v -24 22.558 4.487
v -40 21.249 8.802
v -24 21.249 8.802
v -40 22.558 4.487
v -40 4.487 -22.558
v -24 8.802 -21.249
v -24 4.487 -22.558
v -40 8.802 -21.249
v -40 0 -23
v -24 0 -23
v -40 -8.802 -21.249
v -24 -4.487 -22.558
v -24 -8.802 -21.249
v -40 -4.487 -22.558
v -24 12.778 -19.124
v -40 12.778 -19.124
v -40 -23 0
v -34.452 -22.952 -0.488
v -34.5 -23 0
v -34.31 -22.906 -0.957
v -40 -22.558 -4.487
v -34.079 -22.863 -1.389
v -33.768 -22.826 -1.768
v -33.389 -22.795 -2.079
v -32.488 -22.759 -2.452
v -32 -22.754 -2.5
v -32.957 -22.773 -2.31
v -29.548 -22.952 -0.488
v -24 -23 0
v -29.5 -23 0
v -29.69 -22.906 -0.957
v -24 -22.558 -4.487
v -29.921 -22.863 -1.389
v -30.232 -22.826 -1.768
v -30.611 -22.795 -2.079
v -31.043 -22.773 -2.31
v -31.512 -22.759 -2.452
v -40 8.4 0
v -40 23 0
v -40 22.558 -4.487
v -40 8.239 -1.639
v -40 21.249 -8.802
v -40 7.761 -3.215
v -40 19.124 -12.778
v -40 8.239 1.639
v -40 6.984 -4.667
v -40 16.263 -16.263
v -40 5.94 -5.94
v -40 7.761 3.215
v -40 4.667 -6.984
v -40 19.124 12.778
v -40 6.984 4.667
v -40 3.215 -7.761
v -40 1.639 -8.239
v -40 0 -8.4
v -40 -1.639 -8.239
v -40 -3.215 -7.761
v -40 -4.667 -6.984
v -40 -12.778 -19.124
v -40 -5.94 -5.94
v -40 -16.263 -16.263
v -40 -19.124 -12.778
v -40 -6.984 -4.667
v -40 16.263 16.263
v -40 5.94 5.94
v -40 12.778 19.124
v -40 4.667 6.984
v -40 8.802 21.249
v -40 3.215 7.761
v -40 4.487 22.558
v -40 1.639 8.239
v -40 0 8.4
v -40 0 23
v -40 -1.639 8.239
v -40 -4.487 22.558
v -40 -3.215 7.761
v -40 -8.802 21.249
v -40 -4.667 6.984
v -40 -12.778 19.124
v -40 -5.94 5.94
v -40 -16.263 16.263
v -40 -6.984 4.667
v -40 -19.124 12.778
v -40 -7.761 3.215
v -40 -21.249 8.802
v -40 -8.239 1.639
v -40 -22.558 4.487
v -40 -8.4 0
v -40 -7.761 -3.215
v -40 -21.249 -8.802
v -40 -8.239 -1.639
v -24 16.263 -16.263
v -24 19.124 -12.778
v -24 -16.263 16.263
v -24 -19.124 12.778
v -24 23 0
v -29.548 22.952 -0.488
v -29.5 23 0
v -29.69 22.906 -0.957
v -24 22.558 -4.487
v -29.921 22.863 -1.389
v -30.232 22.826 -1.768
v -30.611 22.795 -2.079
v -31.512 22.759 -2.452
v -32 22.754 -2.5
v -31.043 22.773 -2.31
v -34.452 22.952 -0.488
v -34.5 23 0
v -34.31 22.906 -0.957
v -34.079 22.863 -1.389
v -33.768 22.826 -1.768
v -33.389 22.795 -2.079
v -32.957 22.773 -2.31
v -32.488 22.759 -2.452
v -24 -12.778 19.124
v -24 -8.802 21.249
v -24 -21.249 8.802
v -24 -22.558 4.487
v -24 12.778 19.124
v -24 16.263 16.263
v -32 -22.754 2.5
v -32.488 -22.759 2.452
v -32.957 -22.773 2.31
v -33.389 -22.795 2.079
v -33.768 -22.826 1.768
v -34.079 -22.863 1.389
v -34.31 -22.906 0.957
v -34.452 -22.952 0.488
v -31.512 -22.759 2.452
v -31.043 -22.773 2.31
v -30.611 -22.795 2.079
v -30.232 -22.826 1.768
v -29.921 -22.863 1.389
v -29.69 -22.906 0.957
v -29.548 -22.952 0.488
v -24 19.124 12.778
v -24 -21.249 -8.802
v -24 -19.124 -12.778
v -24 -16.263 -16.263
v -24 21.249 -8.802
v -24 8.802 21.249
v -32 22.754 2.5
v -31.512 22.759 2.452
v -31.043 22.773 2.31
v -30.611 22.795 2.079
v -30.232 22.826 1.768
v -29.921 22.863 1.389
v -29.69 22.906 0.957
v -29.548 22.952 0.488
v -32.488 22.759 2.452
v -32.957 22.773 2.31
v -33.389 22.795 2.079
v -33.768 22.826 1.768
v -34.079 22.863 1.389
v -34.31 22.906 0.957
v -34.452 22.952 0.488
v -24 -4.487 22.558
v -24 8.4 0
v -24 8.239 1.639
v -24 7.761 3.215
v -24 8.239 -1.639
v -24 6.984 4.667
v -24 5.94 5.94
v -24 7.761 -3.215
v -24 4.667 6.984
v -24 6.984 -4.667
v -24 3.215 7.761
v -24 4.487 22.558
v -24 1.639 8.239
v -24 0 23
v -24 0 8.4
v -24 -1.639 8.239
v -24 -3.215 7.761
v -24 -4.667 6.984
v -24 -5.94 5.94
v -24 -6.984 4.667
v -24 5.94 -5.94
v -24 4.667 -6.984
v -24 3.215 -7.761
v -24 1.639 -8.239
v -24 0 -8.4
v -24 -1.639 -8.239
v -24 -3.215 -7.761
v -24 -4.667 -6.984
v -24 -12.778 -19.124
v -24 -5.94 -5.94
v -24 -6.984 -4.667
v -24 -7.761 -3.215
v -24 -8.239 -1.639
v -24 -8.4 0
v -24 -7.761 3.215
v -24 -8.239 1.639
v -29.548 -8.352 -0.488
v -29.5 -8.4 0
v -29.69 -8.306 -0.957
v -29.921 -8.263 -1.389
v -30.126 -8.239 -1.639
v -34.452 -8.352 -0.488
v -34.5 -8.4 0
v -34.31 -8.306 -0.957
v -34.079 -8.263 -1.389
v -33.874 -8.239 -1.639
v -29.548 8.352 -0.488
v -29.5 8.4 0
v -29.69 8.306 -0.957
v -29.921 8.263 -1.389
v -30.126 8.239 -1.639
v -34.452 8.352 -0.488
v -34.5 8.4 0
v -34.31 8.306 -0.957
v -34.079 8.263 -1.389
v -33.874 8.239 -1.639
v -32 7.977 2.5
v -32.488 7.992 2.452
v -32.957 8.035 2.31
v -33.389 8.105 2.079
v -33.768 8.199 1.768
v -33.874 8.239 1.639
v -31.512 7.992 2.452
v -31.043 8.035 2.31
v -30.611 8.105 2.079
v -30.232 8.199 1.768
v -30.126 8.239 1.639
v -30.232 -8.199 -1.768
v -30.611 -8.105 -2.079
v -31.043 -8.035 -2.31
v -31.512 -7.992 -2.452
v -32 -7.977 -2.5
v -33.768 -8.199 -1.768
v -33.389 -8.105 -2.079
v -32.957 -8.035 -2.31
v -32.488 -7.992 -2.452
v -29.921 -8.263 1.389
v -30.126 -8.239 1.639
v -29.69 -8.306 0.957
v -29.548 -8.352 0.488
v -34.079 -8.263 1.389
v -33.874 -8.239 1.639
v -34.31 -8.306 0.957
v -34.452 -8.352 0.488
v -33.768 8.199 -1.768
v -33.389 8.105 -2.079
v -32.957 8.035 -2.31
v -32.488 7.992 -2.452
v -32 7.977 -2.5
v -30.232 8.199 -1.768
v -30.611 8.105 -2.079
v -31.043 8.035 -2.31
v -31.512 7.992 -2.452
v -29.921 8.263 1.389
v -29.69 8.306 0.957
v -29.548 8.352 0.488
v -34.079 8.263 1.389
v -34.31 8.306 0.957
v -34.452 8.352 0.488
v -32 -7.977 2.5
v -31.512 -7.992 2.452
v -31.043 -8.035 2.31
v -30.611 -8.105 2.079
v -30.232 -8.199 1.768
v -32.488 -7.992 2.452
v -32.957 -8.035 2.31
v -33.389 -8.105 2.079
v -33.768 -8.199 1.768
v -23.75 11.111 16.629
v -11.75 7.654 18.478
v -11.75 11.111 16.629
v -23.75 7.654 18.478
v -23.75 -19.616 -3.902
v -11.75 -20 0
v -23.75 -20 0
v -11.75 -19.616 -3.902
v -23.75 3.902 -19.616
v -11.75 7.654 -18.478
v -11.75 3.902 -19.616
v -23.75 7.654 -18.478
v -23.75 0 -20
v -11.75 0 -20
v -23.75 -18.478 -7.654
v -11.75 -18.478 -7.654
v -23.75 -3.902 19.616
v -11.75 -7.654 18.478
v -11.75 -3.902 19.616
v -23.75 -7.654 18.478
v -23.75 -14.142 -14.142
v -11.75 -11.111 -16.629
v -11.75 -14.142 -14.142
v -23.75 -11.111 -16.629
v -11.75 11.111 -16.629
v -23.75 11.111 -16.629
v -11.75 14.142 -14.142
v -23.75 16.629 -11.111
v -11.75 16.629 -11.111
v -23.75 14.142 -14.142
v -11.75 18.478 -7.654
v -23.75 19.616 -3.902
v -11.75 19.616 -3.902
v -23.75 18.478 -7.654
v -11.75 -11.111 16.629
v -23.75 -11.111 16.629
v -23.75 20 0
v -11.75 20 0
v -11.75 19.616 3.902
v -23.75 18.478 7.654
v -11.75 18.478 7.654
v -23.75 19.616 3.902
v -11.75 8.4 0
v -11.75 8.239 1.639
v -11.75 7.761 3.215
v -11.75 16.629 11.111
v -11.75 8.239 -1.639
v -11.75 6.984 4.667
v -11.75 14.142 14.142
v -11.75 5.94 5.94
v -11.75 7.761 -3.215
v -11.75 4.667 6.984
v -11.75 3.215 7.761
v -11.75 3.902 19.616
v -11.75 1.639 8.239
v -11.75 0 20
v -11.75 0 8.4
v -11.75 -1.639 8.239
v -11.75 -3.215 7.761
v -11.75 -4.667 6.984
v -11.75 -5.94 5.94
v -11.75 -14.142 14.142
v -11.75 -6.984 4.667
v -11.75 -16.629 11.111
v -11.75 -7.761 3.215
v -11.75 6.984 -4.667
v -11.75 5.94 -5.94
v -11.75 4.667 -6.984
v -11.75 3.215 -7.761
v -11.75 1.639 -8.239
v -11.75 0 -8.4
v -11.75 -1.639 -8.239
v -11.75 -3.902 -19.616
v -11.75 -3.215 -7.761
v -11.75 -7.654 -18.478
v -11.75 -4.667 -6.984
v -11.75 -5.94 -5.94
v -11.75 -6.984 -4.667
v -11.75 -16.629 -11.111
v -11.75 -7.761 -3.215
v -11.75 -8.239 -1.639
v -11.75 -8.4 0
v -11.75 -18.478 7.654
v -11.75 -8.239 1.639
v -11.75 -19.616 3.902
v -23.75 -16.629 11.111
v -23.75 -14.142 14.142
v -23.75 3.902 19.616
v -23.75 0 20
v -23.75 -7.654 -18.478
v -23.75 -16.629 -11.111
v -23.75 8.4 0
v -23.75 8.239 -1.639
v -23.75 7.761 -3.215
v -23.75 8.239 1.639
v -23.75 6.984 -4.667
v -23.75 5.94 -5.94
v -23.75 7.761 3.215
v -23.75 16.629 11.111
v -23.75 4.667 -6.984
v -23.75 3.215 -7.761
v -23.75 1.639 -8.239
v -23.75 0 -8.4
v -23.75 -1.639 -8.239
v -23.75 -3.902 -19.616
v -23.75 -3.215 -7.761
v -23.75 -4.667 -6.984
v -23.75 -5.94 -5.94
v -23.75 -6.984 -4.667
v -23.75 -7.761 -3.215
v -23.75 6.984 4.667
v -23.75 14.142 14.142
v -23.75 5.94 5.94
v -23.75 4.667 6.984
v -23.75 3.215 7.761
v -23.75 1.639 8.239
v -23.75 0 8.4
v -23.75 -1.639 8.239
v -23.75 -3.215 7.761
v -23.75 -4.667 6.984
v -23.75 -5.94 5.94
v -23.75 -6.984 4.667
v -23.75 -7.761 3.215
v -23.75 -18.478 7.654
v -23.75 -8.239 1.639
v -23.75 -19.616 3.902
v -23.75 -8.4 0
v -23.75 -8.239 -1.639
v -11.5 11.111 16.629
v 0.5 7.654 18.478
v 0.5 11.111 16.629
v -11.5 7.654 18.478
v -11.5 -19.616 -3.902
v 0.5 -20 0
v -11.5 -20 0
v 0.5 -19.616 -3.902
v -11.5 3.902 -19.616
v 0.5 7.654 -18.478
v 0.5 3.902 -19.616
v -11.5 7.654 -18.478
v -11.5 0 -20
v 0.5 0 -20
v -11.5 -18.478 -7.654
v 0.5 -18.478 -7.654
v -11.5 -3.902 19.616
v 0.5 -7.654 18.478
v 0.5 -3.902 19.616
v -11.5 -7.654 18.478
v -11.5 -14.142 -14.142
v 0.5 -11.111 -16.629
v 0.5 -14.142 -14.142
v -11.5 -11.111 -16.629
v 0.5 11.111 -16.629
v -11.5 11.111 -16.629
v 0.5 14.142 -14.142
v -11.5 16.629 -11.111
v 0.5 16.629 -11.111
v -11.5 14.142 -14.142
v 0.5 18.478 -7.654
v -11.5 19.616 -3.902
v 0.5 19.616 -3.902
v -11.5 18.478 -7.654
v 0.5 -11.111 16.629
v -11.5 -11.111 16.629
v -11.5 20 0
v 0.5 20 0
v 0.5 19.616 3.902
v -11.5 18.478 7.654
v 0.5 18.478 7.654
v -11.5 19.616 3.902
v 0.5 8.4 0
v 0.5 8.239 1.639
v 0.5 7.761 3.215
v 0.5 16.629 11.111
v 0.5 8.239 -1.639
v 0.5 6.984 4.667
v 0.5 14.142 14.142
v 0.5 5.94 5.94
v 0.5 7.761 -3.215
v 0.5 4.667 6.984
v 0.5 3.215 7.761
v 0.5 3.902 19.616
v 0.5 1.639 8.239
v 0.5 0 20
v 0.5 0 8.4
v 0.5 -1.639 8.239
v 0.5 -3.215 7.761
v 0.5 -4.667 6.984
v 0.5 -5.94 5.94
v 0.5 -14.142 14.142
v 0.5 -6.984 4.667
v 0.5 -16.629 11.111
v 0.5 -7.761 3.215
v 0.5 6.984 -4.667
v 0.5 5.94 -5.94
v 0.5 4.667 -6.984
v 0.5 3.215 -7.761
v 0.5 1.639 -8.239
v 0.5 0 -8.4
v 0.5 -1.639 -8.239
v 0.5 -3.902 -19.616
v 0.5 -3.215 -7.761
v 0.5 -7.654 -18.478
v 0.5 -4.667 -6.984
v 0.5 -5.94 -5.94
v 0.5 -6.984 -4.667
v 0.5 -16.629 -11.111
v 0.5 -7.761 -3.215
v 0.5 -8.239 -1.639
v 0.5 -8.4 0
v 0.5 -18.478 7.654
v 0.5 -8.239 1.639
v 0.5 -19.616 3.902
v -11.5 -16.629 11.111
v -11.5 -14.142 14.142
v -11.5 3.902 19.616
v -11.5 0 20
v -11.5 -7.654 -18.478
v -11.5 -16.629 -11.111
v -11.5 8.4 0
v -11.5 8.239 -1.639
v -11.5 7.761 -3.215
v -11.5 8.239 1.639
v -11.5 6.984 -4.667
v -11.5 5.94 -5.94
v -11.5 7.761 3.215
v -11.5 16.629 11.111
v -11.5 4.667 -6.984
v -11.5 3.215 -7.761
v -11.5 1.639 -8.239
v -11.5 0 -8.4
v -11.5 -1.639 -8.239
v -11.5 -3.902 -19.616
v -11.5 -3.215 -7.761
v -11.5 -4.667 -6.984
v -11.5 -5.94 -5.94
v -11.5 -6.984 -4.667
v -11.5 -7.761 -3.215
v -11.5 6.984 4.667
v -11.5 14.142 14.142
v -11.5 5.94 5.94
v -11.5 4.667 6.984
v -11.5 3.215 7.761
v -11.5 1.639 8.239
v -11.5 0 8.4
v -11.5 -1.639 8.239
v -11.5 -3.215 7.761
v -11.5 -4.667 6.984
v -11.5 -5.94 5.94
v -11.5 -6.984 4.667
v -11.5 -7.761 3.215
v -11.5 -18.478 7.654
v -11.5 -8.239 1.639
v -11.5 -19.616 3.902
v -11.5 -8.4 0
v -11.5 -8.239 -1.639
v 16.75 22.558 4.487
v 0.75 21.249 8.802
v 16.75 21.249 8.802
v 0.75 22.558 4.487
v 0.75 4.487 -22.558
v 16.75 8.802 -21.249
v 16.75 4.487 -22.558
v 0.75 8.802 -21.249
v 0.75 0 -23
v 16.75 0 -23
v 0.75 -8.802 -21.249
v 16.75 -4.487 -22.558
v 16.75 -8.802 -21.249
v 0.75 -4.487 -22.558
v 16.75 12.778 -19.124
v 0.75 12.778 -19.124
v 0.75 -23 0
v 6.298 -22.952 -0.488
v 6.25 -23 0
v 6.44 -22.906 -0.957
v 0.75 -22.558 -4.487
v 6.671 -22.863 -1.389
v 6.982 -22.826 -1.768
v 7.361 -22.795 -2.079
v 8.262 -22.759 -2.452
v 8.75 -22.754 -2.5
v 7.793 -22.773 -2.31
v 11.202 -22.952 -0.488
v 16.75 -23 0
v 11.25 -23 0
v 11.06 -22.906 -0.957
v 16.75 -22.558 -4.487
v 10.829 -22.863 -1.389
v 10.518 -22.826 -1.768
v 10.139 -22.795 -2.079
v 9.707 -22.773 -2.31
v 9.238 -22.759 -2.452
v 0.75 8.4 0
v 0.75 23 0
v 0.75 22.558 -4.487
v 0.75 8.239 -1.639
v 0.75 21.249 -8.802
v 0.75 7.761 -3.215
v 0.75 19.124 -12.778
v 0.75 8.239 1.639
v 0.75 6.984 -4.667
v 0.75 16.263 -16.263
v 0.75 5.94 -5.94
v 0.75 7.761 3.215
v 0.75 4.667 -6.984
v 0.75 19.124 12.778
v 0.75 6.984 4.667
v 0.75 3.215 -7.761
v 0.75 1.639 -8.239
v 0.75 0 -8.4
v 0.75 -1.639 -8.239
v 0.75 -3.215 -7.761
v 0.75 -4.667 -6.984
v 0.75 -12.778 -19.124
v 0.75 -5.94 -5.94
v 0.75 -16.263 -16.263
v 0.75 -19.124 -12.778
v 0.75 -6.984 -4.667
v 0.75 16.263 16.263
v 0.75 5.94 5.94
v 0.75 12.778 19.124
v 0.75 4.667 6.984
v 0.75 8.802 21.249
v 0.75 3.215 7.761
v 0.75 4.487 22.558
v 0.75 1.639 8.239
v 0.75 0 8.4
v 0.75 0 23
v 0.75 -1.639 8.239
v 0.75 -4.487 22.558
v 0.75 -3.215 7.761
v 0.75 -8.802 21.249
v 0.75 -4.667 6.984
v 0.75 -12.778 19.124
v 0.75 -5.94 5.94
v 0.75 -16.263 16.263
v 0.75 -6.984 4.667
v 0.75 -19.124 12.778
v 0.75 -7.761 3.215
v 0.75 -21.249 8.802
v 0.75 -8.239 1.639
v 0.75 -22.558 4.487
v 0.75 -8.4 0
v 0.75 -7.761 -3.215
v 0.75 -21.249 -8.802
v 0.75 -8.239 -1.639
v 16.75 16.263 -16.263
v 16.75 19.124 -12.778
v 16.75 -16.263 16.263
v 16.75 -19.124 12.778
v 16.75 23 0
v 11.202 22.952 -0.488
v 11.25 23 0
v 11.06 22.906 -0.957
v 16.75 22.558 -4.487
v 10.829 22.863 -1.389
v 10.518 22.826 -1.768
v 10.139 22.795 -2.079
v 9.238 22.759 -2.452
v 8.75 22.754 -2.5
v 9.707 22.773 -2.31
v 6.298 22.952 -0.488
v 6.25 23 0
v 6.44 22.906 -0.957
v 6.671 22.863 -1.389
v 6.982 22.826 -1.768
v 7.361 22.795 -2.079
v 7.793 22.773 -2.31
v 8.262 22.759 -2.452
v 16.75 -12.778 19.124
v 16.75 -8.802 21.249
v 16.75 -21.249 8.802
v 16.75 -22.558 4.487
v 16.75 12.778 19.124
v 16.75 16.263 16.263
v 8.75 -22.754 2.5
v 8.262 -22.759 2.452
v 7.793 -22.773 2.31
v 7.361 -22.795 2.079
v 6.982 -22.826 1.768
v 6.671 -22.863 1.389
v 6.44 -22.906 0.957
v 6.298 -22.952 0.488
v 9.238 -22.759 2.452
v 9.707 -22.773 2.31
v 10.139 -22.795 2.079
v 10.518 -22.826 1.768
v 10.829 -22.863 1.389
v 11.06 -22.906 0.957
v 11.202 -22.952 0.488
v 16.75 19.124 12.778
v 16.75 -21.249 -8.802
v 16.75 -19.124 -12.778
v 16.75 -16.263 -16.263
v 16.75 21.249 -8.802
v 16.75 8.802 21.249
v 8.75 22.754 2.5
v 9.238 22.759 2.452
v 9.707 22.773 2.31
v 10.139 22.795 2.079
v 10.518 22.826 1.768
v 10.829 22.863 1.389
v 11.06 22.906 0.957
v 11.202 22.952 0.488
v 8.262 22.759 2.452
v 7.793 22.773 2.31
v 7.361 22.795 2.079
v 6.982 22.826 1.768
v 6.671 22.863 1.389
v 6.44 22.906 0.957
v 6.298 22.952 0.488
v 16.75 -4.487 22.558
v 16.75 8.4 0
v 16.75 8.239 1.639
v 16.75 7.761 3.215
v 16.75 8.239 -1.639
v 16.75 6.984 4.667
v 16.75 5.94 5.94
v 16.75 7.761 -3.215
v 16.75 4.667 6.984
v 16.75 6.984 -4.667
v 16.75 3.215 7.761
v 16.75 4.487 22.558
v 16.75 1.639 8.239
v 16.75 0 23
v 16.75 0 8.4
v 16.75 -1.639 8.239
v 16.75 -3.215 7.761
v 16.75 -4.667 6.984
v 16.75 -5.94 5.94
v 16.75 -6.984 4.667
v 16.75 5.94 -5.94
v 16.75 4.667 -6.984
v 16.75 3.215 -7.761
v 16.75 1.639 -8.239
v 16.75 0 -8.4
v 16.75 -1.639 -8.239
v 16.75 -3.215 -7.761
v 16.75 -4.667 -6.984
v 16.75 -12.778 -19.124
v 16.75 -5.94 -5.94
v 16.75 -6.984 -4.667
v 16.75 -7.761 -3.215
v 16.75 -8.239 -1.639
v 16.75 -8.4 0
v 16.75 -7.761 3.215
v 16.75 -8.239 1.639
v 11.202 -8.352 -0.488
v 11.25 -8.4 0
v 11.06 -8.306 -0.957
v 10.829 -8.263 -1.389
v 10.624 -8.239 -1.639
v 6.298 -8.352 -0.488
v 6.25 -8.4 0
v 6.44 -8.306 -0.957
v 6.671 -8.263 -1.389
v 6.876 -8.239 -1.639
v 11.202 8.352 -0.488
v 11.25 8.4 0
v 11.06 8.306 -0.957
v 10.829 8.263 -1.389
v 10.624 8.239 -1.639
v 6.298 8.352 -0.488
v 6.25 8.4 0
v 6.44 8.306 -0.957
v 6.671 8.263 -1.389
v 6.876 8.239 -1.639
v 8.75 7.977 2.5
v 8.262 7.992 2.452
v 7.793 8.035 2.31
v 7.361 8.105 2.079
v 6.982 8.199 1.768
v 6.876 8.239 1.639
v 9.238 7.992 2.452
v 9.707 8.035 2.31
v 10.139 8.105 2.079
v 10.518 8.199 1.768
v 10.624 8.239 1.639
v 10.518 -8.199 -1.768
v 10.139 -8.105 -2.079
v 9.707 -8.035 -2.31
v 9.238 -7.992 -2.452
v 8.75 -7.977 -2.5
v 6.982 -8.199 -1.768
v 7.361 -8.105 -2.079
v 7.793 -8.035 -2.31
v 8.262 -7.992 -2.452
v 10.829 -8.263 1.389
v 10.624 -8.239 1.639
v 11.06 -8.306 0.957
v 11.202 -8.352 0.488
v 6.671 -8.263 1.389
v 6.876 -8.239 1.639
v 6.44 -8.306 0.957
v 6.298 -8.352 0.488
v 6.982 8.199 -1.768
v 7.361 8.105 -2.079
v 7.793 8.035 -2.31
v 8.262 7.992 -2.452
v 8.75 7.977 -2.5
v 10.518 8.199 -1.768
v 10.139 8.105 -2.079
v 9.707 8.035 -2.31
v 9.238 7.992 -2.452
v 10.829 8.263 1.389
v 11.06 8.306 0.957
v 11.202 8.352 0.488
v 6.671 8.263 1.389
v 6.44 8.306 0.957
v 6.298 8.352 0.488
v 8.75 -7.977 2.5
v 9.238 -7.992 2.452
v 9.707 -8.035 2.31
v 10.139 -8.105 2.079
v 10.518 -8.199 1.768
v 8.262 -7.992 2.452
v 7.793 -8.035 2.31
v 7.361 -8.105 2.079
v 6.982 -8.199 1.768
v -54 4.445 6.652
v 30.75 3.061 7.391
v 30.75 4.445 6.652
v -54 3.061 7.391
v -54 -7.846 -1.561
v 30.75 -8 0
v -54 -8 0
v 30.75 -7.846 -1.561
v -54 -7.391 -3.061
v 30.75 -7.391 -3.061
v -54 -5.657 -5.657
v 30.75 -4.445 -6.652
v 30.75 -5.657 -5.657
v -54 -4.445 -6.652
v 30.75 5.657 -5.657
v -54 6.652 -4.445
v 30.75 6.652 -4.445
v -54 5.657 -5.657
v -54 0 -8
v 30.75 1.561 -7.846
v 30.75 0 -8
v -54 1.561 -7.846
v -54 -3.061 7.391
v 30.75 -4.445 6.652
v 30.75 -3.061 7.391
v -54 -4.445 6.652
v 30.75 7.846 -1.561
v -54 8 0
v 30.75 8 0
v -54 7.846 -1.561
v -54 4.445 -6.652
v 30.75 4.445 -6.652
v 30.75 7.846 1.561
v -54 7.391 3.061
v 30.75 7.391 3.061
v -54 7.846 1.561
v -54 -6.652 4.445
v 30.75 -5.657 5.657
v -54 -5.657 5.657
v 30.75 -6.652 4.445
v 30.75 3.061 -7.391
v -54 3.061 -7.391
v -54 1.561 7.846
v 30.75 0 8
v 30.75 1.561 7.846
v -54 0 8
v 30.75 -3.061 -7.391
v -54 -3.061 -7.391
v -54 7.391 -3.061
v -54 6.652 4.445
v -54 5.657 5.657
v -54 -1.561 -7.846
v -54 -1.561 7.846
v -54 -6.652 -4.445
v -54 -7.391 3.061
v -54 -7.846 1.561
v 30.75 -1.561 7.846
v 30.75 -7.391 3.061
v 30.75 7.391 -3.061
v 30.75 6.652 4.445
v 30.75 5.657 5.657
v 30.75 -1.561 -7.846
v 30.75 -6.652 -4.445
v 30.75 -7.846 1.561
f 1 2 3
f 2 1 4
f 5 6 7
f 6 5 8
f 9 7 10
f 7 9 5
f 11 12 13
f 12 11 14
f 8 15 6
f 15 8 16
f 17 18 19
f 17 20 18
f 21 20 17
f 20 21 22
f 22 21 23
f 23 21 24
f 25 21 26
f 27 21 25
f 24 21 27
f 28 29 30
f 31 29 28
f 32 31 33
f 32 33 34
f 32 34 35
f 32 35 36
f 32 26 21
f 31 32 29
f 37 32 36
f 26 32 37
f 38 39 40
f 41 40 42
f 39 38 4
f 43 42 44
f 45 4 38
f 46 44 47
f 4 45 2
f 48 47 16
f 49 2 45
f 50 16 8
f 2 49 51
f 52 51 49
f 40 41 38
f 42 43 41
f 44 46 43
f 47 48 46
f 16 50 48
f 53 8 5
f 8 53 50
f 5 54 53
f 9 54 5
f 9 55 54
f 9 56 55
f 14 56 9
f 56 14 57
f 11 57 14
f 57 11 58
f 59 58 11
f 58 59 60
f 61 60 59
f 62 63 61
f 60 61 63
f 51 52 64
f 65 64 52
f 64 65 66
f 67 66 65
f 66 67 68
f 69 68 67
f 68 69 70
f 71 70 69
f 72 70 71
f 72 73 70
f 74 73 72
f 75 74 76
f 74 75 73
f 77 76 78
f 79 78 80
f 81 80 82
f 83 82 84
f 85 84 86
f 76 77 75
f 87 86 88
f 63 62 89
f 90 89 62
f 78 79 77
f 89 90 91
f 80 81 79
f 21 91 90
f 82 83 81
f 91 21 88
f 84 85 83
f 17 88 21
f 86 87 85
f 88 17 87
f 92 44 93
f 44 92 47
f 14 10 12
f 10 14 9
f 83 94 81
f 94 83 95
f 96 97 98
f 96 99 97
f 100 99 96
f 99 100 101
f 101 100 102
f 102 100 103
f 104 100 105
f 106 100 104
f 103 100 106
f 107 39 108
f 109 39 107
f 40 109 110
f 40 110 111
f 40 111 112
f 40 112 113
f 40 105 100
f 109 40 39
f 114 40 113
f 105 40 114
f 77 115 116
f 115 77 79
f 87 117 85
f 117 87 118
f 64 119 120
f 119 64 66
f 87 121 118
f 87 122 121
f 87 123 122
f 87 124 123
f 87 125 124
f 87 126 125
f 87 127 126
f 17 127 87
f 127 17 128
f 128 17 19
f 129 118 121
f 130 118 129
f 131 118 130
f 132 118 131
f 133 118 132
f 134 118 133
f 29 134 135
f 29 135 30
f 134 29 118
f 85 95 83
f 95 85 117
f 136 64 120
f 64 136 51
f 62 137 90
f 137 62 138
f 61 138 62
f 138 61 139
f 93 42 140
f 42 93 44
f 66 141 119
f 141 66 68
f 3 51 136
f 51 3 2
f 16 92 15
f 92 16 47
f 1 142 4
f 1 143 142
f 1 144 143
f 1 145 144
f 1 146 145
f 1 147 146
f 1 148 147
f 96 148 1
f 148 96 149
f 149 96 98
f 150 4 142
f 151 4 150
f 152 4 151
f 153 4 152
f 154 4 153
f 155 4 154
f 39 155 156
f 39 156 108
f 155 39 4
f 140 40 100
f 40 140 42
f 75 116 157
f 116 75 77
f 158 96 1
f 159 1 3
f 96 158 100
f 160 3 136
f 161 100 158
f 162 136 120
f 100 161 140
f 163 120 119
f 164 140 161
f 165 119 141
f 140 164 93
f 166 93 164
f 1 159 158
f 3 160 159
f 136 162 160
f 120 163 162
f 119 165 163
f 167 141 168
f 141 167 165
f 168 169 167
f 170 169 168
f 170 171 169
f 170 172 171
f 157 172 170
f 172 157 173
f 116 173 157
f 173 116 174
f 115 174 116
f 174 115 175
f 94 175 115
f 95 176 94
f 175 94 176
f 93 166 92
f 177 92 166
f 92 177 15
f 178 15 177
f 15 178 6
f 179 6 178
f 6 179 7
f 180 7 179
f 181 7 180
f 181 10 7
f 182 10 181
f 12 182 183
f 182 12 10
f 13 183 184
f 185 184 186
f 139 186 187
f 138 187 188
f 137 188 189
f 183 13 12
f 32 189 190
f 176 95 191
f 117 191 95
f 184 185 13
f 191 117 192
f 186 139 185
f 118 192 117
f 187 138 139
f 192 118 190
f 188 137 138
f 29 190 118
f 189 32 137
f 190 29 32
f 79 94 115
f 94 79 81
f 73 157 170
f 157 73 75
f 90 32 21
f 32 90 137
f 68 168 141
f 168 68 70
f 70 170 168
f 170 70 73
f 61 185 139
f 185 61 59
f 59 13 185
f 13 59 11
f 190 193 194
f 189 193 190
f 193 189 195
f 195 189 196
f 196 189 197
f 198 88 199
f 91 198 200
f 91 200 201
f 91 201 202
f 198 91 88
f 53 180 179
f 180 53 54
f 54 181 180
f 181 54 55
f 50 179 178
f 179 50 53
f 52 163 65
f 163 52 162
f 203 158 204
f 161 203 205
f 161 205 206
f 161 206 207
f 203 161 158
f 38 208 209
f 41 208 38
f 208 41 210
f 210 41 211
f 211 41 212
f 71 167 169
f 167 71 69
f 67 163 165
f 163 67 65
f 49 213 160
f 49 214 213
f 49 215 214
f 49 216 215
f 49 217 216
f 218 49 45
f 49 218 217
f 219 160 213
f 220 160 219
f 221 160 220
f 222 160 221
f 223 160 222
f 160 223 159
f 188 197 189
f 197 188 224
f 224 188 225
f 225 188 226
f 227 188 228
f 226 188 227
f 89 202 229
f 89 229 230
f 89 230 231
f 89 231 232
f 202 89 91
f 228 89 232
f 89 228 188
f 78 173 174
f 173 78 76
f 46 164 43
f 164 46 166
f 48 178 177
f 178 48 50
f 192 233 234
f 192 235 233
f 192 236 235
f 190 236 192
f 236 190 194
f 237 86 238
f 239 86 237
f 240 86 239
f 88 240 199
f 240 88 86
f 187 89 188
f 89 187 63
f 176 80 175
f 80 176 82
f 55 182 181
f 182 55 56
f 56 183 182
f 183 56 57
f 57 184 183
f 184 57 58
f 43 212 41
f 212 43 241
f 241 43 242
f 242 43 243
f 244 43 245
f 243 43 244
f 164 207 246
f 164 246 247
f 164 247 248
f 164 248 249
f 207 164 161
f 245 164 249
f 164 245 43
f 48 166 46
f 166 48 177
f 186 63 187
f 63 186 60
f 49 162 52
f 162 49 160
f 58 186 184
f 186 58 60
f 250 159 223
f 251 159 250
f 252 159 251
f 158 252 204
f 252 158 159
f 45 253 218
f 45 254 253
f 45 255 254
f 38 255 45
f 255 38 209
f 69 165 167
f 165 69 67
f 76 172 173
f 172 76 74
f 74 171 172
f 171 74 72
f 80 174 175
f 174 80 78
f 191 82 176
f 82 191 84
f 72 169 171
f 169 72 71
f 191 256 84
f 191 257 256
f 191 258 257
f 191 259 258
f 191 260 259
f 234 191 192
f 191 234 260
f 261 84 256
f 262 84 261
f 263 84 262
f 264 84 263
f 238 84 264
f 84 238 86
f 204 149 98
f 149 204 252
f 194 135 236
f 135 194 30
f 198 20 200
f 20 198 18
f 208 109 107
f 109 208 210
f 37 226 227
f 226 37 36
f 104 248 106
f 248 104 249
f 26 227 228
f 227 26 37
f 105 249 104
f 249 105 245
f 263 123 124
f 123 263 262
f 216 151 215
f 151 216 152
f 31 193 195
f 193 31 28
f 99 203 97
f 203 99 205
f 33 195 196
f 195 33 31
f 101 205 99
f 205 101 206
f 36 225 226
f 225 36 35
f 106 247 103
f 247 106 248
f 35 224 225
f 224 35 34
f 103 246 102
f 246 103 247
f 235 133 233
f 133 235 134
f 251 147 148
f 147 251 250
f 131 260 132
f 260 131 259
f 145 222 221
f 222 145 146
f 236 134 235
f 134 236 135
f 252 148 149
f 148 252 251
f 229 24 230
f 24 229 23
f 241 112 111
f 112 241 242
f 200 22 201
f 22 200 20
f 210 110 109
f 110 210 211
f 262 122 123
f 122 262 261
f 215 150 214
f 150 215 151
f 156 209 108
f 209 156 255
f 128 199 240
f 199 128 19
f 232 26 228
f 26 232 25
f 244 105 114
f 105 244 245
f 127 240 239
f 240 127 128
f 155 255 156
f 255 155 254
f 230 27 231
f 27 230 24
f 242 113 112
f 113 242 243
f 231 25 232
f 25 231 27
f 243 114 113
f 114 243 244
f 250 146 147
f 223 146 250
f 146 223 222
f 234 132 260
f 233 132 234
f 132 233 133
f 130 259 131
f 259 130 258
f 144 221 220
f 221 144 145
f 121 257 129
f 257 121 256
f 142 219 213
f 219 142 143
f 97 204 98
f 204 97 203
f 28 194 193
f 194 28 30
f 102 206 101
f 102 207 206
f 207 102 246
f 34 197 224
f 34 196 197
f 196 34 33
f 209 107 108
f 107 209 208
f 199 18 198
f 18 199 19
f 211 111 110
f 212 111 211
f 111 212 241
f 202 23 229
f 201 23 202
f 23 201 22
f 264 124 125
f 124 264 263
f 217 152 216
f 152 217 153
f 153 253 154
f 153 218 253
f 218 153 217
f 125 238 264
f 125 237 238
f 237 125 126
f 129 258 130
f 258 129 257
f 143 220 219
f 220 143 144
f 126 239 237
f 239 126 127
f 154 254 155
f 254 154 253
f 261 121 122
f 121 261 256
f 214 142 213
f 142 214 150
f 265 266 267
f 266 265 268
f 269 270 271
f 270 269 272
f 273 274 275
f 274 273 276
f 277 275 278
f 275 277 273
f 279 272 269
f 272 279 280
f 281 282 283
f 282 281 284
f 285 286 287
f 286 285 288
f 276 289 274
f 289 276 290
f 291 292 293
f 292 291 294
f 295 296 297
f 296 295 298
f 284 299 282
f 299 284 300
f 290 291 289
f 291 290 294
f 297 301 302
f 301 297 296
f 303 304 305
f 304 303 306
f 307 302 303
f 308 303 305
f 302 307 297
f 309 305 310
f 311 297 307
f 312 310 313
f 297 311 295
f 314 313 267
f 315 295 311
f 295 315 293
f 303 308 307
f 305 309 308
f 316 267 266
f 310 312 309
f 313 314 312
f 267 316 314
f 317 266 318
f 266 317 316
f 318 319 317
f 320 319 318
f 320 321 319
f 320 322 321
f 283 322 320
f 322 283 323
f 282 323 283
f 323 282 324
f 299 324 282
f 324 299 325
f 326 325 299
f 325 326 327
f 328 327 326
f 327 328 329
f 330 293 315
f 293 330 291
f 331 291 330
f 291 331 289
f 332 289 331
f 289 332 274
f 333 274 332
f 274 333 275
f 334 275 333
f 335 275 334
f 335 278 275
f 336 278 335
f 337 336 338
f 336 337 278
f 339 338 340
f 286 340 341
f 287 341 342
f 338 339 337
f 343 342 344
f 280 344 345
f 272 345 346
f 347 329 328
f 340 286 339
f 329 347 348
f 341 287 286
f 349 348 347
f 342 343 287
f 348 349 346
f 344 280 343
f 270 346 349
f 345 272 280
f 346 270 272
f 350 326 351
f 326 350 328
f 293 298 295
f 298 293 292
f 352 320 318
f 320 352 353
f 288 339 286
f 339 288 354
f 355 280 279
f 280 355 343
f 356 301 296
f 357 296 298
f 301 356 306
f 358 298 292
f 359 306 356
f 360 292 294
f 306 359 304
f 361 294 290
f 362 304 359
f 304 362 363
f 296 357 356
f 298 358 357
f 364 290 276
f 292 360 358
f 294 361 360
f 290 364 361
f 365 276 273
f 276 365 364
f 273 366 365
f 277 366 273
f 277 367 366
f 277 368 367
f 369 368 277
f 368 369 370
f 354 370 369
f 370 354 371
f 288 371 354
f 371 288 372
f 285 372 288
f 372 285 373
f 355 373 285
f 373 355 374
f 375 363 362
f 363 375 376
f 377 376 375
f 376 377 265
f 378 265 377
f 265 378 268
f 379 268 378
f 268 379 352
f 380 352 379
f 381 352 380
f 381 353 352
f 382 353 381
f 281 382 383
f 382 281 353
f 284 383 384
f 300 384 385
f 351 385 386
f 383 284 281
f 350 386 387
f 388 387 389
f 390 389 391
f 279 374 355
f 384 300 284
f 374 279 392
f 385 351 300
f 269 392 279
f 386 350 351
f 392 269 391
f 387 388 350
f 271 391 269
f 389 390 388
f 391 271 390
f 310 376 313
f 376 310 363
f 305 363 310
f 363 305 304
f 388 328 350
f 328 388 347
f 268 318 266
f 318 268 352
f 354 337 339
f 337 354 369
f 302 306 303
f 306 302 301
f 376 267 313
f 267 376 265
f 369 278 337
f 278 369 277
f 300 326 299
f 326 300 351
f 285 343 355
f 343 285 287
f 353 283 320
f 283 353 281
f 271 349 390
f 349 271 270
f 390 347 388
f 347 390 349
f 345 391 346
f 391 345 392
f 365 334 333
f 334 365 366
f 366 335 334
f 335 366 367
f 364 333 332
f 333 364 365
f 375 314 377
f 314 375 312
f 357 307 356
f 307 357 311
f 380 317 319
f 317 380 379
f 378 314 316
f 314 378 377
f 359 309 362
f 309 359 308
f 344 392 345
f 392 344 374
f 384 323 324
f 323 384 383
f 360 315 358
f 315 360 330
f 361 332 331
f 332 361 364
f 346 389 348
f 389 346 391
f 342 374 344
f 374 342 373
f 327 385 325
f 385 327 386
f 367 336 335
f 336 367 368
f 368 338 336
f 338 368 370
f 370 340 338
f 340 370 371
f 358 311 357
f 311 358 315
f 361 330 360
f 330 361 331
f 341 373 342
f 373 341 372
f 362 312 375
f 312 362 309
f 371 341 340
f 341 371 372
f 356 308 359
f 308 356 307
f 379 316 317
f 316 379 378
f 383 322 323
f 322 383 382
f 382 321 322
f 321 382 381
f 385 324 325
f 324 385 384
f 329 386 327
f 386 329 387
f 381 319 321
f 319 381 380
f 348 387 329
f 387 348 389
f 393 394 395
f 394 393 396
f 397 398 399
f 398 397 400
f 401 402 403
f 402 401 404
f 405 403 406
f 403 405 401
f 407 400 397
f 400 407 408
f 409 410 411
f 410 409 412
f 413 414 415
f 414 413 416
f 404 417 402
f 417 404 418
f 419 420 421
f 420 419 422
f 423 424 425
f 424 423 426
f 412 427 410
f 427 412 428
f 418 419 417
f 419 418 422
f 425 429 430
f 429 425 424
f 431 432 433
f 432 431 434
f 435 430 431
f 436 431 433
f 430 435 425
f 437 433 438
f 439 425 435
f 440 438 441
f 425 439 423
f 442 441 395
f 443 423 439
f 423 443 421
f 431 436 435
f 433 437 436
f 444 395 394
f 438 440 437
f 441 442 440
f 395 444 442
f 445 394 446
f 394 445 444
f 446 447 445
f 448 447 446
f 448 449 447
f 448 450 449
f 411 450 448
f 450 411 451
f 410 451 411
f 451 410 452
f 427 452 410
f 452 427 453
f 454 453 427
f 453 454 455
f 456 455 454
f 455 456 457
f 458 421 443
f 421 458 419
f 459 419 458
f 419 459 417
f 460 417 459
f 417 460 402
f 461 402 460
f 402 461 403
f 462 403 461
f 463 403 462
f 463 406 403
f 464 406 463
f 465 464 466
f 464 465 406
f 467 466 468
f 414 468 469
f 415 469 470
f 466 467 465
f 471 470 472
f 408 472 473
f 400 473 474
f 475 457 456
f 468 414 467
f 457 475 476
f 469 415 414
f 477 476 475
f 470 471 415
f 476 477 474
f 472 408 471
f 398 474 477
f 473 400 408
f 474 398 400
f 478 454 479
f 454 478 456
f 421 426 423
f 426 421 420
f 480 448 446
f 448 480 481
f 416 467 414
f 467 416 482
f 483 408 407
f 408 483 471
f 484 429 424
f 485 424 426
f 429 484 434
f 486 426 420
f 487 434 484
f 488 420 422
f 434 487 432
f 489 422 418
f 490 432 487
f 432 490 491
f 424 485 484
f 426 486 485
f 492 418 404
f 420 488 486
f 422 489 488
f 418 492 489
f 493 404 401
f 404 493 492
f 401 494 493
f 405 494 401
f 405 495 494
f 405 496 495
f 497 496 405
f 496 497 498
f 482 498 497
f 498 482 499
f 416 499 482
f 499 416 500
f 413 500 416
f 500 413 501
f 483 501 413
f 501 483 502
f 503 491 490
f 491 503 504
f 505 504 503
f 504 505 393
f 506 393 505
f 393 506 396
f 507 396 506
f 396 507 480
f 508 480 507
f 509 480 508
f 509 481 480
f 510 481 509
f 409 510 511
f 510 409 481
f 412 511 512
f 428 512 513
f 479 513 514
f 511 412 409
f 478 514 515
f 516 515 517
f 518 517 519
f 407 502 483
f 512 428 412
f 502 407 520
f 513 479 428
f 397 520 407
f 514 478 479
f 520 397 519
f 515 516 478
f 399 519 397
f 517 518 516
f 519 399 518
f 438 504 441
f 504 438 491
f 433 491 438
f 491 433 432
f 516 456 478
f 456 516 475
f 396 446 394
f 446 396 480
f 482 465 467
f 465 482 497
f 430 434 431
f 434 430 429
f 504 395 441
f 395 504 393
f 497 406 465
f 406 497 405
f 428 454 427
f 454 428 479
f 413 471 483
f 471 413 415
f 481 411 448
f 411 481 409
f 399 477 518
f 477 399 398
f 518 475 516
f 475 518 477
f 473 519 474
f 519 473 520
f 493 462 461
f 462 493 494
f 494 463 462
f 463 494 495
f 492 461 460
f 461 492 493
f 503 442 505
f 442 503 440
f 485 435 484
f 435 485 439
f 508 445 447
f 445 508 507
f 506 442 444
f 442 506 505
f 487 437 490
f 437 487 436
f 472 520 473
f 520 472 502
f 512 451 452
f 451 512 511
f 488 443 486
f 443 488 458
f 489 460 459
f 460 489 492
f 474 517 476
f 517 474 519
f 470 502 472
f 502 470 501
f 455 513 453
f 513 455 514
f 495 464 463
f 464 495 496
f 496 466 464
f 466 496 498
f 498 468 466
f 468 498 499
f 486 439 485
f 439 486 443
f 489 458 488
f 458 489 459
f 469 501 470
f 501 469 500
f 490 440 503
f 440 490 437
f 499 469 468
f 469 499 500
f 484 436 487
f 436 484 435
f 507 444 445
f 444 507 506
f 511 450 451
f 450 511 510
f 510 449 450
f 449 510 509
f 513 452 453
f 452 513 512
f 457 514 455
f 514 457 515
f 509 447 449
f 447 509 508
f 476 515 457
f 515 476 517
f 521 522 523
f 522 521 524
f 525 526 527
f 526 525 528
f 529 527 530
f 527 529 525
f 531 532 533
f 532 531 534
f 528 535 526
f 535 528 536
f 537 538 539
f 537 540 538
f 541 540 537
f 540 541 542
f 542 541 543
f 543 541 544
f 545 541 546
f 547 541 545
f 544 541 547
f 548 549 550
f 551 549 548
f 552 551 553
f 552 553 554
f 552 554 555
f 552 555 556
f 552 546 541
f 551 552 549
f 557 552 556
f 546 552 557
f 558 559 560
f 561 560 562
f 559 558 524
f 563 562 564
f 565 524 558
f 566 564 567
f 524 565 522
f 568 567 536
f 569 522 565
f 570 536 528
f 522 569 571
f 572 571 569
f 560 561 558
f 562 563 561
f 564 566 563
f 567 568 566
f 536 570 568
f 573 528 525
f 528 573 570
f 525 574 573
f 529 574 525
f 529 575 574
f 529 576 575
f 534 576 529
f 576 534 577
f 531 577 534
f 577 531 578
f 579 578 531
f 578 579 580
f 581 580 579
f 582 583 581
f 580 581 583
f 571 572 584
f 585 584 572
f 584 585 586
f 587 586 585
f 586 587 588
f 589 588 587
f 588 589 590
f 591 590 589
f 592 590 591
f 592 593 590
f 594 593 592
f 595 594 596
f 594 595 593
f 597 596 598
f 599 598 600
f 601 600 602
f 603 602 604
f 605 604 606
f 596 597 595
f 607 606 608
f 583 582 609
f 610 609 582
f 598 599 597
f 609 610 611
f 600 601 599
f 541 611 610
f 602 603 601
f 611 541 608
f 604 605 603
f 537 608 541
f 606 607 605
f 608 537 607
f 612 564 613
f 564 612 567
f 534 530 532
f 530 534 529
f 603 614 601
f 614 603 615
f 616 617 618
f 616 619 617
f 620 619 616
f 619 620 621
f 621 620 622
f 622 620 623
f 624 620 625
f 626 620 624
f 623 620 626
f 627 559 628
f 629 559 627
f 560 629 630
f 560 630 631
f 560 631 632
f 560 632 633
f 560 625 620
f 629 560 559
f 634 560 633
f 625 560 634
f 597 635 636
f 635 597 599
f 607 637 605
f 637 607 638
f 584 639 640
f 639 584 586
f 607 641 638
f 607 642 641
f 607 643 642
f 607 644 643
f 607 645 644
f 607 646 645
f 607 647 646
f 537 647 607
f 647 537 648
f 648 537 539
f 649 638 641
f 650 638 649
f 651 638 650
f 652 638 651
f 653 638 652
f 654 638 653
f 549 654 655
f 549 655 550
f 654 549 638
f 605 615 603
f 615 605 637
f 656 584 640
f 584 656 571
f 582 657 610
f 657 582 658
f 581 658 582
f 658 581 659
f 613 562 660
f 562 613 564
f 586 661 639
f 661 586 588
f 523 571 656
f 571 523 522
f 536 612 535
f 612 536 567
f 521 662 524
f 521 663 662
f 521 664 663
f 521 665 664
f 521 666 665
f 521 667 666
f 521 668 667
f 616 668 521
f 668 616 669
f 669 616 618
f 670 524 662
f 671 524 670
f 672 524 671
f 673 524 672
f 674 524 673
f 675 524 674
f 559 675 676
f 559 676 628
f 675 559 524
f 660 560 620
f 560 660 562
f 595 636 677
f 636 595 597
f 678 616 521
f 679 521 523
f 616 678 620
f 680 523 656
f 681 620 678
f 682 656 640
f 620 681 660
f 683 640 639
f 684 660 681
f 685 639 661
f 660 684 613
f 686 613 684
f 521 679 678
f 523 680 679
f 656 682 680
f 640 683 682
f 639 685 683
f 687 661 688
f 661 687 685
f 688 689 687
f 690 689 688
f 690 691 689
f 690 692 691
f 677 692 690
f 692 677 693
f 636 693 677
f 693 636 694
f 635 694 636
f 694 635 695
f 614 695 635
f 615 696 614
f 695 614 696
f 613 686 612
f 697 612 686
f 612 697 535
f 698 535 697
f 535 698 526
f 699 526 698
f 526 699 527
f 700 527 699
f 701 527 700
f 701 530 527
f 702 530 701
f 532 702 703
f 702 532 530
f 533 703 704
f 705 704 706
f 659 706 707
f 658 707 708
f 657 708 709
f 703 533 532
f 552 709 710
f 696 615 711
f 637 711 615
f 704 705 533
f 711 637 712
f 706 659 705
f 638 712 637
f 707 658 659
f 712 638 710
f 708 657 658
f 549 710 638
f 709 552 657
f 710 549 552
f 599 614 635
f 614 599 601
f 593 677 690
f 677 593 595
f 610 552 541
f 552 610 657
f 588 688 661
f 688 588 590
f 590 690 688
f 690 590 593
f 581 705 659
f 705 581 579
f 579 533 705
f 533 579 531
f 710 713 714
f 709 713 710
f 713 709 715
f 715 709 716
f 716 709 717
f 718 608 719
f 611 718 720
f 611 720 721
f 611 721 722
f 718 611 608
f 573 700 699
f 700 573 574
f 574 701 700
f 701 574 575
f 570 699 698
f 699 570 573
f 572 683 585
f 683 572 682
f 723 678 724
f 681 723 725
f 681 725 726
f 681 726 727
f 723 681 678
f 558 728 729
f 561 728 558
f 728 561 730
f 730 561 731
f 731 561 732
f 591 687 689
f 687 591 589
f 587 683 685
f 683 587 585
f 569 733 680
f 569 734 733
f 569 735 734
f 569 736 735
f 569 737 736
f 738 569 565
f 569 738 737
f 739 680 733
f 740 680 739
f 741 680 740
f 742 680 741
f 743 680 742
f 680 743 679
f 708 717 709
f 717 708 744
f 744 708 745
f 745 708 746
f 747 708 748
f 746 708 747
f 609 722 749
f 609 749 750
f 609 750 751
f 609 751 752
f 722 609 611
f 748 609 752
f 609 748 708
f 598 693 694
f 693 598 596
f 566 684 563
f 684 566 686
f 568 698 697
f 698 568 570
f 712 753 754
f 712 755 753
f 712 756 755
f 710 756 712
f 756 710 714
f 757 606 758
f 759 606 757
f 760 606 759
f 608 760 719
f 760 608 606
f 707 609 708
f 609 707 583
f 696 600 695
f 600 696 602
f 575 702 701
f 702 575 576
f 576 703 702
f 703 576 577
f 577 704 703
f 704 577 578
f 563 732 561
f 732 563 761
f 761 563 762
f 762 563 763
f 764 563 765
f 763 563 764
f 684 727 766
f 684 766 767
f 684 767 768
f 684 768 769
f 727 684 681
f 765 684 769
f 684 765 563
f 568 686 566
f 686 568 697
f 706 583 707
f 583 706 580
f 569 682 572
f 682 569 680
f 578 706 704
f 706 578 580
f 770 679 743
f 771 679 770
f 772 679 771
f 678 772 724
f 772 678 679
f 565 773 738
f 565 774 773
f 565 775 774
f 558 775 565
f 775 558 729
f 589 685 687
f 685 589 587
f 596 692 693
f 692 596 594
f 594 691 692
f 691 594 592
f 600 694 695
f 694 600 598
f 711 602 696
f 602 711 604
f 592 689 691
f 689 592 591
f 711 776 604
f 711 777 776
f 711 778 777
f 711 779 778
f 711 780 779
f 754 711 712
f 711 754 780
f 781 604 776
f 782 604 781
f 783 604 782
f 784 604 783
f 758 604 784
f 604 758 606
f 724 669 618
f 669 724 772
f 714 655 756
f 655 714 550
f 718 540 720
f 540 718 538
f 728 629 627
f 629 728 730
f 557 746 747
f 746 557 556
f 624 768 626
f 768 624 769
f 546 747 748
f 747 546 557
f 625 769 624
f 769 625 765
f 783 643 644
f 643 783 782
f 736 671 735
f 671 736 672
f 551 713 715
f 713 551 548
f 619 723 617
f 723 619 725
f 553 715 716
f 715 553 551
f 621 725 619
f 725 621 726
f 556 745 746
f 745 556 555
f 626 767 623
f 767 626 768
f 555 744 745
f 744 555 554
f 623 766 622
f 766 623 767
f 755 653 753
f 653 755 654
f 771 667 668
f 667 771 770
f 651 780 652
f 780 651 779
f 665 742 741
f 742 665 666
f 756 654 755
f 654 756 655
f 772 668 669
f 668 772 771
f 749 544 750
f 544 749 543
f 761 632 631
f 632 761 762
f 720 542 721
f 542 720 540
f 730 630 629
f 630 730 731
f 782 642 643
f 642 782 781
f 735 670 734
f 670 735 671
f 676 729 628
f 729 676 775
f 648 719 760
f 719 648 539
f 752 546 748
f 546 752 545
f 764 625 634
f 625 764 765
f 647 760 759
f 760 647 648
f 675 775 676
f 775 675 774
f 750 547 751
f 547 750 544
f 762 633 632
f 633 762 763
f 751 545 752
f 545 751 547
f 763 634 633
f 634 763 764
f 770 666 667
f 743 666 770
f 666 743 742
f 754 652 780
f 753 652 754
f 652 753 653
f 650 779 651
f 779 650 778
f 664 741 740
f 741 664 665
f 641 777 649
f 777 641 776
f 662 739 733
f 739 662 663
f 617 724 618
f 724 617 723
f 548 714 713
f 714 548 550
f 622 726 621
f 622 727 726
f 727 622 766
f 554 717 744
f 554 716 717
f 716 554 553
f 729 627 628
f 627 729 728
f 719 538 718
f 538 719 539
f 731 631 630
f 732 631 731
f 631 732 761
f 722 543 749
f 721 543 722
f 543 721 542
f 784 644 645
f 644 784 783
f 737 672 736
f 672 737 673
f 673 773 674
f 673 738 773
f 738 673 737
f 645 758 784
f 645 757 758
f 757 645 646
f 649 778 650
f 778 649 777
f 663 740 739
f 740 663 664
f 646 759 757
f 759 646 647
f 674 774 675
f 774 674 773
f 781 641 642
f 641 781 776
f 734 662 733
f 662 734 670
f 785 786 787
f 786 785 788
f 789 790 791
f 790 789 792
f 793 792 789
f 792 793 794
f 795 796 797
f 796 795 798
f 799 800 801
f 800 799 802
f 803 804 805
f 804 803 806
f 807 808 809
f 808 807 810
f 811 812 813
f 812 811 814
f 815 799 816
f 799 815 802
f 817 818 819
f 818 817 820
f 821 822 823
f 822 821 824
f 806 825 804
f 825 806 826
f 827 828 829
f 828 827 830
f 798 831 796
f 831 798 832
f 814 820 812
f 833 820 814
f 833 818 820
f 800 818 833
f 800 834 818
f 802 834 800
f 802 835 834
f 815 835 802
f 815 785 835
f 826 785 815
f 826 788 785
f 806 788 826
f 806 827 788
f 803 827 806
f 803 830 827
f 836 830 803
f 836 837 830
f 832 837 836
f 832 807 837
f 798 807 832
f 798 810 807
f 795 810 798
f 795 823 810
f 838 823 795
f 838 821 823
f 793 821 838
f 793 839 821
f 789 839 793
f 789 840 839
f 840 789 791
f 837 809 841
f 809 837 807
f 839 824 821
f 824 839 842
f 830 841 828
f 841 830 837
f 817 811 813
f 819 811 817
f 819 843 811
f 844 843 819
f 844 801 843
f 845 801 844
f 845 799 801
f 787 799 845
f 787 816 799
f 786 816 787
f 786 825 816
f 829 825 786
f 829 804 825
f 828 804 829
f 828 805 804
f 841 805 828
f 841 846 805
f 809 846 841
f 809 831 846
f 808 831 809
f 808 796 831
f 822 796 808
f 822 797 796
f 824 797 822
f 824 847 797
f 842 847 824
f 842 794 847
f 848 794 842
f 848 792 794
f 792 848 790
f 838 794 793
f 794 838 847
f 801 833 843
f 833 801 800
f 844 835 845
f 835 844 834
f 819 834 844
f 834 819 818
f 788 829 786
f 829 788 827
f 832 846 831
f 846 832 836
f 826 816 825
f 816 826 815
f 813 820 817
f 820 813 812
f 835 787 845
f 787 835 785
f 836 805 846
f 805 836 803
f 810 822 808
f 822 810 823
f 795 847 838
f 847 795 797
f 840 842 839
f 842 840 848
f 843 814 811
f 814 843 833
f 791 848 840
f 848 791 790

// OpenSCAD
$fn = 32;

// ------------------------------------------------------------------------
// Shaft with rings and collars: d16 shaft, 4 rings
// Every part is its own module, assembly() places them once.
// ------------------------------------------------------------------------

// --- part 1 ---
module shaft() {
  translate([0, 0, -42.375]) cylinder(h = 84.75, d = 16);
}

// --- part 2 ---
module collar_a() {
  difference() {
    cylinder(h = 16, d = 46);
    translate([0, 0, -1]) cylinder(h = 18, d = 16.8);
    translate([0, 0, 8]) rotate([90, 0, 0]) cylinder(h = 48, d = 5, center = true);
  }
}

// --- part 3 ---
module spacer_a() {
  difference() {
      translate([0, 0, 0]) cylinder(h = 12, d = 40);
      translate([0, 0, -1]) cylinder(h = 14, d = 16.8);
    }
}

// --- part 4 ---
module spacer_b() {
  difference() {
      translate([0, 0, 0]) cylinder(h = 12, d = 40);
      translate([0, 0, -1]) cylinder(h = 14, d = 16.8);
    }
}

// --- part 5 ---
module collar_b() {
  difference() {
    cylinder(h = 16, d = 46);
    translate([0, 0, -1]) cylinder(h = 18, d = 16.8);
    translate([0, 0, 8]) rotate([90, 0, 0]) cylinder(h = 48, d = 5, center = true);
  }
}

// --- assembly ---
module assembly() {
  translate([-11.625, 0, 0]) rotate([0, 90, 0]) shaft();
  translate([-40, 0, 0]) rotate([0, 90, 0]) collar_a();
  translate([-23.75, 0, 0]) rotate([0, 90, 0]) spacer_a();
  translate([-11.5, 0, 0]) rotate([0, 90, 0]) spacer_b();
  translate([0.75, 0, 0]) rotate([0, 90, 0]) collar_b();
}

assembly();
